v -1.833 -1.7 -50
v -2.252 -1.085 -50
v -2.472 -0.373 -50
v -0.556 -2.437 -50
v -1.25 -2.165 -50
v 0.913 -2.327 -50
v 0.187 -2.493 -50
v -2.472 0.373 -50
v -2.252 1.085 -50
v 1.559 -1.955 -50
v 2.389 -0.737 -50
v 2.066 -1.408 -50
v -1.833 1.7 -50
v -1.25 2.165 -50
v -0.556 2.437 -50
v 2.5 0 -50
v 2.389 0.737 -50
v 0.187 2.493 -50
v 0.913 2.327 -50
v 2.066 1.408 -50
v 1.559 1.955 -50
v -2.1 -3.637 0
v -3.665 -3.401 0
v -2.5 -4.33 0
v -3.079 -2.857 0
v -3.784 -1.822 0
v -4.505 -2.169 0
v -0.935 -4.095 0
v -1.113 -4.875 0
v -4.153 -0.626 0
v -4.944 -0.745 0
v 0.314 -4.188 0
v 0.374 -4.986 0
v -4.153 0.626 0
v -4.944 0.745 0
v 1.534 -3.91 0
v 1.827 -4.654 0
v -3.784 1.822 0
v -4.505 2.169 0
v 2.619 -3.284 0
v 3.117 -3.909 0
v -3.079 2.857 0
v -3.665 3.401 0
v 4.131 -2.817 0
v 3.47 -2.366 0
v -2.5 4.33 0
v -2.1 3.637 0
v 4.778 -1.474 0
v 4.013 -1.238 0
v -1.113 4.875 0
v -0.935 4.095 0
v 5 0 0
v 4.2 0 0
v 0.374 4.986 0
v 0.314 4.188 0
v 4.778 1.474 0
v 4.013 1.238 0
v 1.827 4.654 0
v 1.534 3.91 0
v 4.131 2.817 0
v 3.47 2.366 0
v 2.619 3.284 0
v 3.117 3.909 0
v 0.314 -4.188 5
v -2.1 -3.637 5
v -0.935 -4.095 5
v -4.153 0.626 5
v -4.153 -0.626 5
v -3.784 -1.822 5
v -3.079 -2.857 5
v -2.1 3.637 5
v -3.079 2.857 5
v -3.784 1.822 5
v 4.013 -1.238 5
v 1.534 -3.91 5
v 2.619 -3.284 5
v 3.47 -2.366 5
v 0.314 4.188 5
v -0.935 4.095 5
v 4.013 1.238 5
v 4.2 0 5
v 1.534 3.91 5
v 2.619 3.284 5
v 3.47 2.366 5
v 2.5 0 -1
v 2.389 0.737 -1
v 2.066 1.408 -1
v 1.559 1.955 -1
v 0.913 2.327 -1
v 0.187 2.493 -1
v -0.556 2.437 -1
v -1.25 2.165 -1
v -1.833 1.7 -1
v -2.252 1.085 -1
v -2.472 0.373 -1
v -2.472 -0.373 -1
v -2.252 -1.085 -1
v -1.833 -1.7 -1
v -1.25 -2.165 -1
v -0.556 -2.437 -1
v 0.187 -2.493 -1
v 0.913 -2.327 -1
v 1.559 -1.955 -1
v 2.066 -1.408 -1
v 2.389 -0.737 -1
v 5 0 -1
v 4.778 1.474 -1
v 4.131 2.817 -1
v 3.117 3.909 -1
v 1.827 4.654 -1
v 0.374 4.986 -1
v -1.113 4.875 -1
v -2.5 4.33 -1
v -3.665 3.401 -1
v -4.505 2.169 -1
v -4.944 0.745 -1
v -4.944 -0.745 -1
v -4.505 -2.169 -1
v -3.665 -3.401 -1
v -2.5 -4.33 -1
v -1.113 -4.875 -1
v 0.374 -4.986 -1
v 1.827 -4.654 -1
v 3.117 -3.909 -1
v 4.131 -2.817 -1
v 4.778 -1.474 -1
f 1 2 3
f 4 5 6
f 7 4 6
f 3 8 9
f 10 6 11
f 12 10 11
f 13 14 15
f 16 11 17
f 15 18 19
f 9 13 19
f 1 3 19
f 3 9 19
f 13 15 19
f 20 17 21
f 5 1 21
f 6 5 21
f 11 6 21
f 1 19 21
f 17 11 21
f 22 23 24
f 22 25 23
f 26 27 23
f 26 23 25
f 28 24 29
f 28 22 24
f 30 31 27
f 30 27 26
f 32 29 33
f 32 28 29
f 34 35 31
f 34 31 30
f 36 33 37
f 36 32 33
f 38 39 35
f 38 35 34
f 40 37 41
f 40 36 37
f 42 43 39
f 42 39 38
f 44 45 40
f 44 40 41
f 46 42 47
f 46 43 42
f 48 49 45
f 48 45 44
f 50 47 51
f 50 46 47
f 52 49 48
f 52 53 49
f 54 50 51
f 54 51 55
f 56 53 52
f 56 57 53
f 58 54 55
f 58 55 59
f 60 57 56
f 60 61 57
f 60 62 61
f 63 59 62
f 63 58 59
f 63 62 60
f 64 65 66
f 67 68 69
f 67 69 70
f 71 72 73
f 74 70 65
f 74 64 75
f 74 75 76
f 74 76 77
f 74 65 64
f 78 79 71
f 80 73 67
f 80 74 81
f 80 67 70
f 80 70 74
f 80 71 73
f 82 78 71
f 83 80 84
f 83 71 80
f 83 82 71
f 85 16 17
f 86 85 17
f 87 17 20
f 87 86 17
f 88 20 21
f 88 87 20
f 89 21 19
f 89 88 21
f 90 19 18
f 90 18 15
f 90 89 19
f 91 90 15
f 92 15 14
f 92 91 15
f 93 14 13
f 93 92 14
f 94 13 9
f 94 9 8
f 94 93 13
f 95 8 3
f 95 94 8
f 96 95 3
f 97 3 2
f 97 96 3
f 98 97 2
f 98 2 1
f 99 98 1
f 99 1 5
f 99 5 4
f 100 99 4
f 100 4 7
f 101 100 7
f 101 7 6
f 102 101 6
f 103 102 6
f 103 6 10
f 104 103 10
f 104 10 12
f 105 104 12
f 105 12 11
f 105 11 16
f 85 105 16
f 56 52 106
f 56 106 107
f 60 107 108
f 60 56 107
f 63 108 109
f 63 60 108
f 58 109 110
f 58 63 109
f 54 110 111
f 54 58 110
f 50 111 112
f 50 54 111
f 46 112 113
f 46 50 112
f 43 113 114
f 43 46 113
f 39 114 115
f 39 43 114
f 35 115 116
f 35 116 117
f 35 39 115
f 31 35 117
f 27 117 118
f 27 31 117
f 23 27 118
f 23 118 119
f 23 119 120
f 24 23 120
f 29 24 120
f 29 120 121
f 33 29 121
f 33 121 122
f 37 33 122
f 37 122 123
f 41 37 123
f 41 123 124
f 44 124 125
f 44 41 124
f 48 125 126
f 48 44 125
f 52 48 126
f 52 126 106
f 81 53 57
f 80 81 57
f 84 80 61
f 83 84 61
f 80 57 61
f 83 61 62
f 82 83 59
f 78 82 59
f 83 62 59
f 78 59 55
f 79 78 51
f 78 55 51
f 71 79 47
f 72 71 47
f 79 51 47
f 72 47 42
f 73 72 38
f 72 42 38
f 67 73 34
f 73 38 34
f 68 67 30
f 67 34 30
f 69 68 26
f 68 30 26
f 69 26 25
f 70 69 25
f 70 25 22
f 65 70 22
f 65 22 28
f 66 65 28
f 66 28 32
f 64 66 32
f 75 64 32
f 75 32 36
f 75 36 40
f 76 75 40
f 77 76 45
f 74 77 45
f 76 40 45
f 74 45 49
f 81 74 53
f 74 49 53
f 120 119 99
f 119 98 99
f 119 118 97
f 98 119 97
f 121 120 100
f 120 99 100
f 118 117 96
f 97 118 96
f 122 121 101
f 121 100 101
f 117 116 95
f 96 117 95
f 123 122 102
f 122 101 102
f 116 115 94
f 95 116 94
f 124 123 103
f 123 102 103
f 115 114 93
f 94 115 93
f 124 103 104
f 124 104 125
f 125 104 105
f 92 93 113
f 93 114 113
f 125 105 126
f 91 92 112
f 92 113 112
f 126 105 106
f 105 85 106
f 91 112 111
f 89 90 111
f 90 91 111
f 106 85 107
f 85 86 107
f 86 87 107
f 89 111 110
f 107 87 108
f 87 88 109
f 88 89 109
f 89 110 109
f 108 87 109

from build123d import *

# Parameters (mm, degrees)
F0_R     = 2.5
F1_DEPTH = 50
F2_R     = 4.2
F3_DEPTH = 5
F4_R     = 5
F5_DEPTH = 1


with BuildPart() as f1:
    # F0 (on Top) → F1 (new body)
    with BuildSketch(Plane.XY):
        Circle(F0_R)
    extrude(amount=-F1_DEPTH)

    # F2 (on Top) → F3 (join)
    with BuildSketch(Plane.XY):
        Circle(F2_R)
    extrude(amount=F3_DEPTH)

    # F4 (on Top) → F5 (join)
    with BuildSketch(Plane.XY):
        Circle(F4_R)
    extrude(amount=-F5_DEPTH)


solid = f1.part
